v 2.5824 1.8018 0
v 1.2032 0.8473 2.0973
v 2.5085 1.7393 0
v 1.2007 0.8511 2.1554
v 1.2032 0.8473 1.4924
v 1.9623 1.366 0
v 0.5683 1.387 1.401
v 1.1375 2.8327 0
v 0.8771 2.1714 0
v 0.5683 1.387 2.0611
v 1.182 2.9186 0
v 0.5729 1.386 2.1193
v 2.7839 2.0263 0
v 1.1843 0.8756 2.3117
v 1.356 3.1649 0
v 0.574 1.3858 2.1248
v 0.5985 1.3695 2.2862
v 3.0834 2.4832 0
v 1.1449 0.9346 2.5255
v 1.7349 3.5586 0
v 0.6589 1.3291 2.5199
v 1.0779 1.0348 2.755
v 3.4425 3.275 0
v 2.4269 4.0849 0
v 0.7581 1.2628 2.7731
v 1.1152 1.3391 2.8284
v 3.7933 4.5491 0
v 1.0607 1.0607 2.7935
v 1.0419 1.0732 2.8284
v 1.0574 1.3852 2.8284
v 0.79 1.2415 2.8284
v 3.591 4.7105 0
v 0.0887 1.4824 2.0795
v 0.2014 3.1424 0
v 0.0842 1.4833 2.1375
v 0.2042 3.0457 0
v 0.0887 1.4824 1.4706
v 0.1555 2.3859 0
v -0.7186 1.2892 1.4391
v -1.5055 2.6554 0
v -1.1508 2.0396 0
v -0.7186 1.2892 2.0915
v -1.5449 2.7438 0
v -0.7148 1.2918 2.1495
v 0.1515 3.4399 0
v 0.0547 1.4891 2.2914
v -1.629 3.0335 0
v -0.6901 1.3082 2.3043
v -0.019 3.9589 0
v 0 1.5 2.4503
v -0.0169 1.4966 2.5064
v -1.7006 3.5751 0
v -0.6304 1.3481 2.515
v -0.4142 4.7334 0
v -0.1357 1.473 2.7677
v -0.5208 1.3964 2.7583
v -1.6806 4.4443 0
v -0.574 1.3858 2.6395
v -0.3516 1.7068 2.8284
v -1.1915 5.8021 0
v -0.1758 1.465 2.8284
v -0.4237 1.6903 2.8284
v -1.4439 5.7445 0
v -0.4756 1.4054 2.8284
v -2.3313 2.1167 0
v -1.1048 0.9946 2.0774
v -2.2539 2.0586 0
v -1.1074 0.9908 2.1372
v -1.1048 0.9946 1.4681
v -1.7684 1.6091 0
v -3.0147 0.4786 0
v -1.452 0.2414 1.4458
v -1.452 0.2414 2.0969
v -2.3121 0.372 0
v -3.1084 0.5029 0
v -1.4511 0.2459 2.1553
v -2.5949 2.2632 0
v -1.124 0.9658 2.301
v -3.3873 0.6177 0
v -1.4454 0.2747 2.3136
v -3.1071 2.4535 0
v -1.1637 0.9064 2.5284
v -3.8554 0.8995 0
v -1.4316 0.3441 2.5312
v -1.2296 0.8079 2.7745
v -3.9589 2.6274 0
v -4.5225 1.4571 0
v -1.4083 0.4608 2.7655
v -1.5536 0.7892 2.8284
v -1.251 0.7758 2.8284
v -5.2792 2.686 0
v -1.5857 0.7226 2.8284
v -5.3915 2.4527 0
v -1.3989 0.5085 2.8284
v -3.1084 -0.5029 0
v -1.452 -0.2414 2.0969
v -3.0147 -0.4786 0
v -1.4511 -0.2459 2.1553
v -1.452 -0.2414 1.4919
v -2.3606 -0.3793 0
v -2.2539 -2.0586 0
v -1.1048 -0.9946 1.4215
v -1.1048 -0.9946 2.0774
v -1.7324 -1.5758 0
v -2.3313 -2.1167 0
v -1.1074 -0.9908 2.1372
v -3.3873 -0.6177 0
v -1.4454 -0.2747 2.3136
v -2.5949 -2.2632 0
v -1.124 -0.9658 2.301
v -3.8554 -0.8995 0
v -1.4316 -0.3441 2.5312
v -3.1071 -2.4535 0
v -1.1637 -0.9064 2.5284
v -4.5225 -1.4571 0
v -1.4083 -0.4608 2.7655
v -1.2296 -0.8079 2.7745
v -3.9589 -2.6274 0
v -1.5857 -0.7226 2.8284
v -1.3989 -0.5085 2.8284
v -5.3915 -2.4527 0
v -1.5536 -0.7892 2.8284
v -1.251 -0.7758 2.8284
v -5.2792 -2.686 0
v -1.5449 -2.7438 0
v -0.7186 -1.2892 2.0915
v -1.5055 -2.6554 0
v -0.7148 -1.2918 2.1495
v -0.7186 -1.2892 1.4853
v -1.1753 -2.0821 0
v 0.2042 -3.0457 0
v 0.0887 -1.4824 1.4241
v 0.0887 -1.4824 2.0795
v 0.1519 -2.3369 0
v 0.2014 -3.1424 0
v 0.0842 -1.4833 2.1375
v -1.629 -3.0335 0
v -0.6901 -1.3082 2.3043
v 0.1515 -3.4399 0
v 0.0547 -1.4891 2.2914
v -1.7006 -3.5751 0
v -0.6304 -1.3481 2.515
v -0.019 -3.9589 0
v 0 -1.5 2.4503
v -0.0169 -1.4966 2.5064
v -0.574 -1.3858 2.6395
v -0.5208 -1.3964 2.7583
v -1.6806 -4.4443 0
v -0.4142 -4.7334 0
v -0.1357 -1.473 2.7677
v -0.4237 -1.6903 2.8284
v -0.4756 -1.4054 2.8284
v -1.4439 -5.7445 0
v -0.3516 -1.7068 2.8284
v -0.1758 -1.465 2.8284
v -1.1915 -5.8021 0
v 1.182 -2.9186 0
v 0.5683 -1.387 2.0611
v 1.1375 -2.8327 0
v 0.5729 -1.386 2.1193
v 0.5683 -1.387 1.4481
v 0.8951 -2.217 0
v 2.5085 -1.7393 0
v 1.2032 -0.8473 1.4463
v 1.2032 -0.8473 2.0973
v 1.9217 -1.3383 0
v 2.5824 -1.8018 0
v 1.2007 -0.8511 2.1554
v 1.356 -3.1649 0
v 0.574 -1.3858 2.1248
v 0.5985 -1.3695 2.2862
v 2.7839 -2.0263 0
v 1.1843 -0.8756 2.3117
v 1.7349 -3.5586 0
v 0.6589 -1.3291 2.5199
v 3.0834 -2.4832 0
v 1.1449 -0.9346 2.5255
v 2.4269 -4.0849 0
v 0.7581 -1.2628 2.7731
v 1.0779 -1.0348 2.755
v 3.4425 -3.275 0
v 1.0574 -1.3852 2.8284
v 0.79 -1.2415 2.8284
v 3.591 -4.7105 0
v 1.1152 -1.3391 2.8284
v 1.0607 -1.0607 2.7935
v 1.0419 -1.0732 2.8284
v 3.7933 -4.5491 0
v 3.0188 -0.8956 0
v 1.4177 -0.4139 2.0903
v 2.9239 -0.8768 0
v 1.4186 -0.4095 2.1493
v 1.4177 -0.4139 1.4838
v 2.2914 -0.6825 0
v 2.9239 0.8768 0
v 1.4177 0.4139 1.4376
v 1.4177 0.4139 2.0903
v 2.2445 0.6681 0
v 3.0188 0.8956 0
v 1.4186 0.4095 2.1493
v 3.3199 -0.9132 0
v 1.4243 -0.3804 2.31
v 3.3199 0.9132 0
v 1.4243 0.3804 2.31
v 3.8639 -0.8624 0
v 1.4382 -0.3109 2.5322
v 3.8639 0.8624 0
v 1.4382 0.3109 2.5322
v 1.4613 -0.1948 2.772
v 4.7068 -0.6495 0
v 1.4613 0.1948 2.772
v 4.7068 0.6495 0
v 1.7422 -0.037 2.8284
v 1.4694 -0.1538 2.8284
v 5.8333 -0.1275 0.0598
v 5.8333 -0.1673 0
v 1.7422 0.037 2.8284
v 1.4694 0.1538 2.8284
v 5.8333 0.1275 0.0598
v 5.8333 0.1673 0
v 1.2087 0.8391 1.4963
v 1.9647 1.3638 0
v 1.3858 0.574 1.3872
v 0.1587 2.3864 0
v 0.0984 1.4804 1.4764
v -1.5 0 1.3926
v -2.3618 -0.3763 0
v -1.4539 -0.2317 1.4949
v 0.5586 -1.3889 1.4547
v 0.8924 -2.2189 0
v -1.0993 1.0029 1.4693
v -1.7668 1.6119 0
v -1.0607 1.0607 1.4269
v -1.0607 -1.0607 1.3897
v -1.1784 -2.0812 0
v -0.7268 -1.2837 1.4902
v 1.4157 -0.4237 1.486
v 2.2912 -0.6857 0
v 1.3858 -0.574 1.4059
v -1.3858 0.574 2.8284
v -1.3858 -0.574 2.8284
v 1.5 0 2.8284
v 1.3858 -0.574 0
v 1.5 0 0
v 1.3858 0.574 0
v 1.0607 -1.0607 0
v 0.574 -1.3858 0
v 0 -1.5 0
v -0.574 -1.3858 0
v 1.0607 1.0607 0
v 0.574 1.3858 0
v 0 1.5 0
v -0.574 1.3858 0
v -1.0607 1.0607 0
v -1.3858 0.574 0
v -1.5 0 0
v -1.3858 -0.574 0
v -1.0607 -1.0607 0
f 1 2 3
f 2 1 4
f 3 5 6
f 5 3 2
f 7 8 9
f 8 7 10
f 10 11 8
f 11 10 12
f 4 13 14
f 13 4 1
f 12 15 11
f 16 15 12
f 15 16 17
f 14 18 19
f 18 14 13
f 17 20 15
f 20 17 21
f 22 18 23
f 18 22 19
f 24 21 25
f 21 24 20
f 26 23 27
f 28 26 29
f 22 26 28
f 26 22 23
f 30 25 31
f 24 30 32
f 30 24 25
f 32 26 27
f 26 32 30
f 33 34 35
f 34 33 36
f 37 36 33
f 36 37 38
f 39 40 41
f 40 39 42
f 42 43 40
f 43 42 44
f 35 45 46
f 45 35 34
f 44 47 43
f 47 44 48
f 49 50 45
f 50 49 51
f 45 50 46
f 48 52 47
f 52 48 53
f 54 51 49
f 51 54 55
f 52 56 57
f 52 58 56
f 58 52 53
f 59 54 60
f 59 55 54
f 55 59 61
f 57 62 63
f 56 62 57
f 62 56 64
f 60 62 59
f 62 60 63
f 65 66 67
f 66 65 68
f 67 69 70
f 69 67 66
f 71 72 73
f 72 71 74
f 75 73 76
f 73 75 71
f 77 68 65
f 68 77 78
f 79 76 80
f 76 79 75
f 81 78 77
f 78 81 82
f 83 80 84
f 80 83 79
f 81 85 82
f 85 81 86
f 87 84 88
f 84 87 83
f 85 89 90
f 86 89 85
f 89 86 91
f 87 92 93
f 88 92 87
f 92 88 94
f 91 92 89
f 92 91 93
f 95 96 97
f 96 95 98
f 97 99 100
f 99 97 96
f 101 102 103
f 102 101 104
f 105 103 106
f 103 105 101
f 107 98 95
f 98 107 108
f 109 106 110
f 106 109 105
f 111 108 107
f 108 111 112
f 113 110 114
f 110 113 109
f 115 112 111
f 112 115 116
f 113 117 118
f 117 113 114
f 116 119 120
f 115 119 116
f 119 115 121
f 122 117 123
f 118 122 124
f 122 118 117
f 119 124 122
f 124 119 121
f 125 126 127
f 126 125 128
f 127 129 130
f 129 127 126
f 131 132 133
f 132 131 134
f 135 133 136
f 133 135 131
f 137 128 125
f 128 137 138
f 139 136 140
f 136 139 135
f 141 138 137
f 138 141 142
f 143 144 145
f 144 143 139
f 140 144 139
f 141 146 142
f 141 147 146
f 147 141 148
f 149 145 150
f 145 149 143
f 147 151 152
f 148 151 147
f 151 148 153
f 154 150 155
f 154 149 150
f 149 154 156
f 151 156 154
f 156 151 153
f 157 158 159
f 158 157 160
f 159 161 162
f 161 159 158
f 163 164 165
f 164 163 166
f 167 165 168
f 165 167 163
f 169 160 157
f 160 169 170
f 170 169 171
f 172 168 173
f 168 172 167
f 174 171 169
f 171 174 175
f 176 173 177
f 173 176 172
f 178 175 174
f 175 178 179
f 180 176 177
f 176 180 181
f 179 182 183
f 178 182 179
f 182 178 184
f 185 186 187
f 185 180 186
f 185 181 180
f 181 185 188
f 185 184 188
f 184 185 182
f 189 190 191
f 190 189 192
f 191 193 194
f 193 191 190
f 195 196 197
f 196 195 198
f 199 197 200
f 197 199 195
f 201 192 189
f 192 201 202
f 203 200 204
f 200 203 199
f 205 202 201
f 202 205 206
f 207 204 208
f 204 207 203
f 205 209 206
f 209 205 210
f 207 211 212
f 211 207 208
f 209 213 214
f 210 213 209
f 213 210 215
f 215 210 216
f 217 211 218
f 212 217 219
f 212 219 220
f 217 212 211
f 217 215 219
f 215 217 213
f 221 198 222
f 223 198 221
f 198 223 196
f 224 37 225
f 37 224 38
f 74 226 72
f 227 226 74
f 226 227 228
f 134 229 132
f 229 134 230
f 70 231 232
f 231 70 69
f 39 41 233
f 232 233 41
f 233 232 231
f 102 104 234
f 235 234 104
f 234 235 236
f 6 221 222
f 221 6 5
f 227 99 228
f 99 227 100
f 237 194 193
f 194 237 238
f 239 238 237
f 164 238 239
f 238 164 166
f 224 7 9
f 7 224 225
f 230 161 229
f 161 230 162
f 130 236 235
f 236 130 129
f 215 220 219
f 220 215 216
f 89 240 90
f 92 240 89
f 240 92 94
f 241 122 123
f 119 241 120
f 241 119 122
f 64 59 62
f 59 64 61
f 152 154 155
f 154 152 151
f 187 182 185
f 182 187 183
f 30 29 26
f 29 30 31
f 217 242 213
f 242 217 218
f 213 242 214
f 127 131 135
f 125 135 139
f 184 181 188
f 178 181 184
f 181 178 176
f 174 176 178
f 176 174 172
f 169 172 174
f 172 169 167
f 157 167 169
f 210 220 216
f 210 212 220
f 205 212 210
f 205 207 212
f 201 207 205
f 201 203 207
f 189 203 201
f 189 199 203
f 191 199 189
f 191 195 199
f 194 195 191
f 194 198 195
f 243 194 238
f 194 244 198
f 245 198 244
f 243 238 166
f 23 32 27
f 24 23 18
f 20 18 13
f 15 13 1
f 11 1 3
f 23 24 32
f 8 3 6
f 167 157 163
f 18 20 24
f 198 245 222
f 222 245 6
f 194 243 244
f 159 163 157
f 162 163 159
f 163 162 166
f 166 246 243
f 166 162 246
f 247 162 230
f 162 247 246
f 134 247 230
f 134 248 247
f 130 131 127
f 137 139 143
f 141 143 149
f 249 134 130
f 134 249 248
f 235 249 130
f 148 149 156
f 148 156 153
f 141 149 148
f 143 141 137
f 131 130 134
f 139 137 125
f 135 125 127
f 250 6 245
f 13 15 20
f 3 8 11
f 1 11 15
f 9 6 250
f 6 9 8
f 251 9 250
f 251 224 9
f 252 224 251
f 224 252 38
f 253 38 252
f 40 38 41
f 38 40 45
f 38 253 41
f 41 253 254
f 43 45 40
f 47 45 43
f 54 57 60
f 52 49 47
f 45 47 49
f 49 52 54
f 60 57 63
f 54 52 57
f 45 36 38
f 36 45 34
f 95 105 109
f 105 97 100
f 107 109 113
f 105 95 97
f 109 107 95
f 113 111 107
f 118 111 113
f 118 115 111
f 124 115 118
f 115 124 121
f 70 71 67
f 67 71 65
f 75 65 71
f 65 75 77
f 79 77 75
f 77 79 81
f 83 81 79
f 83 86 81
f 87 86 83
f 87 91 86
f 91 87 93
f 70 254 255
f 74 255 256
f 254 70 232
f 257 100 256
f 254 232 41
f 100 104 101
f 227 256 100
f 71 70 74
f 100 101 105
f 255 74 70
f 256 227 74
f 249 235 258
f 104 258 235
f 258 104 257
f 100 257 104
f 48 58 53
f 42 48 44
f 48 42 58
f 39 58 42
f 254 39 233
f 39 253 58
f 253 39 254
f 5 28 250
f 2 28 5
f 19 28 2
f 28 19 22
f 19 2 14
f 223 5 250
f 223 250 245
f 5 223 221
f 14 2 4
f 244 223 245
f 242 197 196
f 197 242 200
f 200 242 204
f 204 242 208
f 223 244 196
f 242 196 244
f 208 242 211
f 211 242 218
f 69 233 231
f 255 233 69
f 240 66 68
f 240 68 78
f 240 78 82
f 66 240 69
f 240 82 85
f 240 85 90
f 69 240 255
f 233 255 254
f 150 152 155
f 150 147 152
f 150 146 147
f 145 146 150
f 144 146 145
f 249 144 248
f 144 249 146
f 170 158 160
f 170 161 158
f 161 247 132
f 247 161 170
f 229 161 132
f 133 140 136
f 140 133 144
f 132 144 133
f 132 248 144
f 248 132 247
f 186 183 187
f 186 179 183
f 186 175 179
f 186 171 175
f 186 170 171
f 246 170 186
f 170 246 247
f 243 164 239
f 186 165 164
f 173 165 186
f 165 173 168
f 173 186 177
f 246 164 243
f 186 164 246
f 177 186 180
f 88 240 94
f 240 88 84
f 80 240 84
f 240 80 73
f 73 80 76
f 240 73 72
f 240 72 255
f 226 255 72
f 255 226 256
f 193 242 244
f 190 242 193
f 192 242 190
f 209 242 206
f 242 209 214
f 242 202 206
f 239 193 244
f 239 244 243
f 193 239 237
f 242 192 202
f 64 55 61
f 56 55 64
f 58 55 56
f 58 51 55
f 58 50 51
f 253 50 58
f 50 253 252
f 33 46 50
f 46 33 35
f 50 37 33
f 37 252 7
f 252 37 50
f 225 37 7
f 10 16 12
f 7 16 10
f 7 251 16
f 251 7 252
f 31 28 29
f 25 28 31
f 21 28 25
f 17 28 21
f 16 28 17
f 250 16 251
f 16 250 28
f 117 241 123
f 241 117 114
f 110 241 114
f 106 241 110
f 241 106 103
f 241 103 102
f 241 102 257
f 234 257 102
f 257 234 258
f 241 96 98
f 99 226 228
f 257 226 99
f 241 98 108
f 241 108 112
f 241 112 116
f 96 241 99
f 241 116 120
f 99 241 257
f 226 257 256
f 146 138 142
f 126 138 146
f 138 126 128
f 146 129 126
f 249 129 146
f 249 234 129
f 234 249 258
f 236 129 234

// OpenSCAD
// This document uses MILLIMETRES as a unit.

use <MCAD/involute_gears.scad>;

// Set $fs (smallest arc fragment) to lower value than default 2.0
$fs = 0.6; // millimetres
$fa = 4;

// Small bevel gear.

module main()
{
    // Pitch angle must 45, for shafts at a right andle.
    
    outside_circular_pitch = 200;
    gear_teeth = 7;
    outside_pitch_radius = gear_teeth * outside_circular_pitch / 360;
    pitch_apex=outside_pitch_radius; // For 90 degree axes
                
    cone_distance = sqrt (pow (pitch_apex, 2) + pow (outside_pitch_radius, 2));
    
    bevel_gear(
        bore_diameter=3.0,
        face_width=4.0, 
        gear_thickness = 6.0,
        cone_distance=cone_distance,
        // pressure_angle=45,
        outside_circular_pitch=outside_circular_pitch,
        number_of_teeth=gear_teeth,
        finish=0
        );
    translate([0,0,-7])
        %linear_extrude(height = 5.0) {
            circle(r=5.0);
    }
}

main();
